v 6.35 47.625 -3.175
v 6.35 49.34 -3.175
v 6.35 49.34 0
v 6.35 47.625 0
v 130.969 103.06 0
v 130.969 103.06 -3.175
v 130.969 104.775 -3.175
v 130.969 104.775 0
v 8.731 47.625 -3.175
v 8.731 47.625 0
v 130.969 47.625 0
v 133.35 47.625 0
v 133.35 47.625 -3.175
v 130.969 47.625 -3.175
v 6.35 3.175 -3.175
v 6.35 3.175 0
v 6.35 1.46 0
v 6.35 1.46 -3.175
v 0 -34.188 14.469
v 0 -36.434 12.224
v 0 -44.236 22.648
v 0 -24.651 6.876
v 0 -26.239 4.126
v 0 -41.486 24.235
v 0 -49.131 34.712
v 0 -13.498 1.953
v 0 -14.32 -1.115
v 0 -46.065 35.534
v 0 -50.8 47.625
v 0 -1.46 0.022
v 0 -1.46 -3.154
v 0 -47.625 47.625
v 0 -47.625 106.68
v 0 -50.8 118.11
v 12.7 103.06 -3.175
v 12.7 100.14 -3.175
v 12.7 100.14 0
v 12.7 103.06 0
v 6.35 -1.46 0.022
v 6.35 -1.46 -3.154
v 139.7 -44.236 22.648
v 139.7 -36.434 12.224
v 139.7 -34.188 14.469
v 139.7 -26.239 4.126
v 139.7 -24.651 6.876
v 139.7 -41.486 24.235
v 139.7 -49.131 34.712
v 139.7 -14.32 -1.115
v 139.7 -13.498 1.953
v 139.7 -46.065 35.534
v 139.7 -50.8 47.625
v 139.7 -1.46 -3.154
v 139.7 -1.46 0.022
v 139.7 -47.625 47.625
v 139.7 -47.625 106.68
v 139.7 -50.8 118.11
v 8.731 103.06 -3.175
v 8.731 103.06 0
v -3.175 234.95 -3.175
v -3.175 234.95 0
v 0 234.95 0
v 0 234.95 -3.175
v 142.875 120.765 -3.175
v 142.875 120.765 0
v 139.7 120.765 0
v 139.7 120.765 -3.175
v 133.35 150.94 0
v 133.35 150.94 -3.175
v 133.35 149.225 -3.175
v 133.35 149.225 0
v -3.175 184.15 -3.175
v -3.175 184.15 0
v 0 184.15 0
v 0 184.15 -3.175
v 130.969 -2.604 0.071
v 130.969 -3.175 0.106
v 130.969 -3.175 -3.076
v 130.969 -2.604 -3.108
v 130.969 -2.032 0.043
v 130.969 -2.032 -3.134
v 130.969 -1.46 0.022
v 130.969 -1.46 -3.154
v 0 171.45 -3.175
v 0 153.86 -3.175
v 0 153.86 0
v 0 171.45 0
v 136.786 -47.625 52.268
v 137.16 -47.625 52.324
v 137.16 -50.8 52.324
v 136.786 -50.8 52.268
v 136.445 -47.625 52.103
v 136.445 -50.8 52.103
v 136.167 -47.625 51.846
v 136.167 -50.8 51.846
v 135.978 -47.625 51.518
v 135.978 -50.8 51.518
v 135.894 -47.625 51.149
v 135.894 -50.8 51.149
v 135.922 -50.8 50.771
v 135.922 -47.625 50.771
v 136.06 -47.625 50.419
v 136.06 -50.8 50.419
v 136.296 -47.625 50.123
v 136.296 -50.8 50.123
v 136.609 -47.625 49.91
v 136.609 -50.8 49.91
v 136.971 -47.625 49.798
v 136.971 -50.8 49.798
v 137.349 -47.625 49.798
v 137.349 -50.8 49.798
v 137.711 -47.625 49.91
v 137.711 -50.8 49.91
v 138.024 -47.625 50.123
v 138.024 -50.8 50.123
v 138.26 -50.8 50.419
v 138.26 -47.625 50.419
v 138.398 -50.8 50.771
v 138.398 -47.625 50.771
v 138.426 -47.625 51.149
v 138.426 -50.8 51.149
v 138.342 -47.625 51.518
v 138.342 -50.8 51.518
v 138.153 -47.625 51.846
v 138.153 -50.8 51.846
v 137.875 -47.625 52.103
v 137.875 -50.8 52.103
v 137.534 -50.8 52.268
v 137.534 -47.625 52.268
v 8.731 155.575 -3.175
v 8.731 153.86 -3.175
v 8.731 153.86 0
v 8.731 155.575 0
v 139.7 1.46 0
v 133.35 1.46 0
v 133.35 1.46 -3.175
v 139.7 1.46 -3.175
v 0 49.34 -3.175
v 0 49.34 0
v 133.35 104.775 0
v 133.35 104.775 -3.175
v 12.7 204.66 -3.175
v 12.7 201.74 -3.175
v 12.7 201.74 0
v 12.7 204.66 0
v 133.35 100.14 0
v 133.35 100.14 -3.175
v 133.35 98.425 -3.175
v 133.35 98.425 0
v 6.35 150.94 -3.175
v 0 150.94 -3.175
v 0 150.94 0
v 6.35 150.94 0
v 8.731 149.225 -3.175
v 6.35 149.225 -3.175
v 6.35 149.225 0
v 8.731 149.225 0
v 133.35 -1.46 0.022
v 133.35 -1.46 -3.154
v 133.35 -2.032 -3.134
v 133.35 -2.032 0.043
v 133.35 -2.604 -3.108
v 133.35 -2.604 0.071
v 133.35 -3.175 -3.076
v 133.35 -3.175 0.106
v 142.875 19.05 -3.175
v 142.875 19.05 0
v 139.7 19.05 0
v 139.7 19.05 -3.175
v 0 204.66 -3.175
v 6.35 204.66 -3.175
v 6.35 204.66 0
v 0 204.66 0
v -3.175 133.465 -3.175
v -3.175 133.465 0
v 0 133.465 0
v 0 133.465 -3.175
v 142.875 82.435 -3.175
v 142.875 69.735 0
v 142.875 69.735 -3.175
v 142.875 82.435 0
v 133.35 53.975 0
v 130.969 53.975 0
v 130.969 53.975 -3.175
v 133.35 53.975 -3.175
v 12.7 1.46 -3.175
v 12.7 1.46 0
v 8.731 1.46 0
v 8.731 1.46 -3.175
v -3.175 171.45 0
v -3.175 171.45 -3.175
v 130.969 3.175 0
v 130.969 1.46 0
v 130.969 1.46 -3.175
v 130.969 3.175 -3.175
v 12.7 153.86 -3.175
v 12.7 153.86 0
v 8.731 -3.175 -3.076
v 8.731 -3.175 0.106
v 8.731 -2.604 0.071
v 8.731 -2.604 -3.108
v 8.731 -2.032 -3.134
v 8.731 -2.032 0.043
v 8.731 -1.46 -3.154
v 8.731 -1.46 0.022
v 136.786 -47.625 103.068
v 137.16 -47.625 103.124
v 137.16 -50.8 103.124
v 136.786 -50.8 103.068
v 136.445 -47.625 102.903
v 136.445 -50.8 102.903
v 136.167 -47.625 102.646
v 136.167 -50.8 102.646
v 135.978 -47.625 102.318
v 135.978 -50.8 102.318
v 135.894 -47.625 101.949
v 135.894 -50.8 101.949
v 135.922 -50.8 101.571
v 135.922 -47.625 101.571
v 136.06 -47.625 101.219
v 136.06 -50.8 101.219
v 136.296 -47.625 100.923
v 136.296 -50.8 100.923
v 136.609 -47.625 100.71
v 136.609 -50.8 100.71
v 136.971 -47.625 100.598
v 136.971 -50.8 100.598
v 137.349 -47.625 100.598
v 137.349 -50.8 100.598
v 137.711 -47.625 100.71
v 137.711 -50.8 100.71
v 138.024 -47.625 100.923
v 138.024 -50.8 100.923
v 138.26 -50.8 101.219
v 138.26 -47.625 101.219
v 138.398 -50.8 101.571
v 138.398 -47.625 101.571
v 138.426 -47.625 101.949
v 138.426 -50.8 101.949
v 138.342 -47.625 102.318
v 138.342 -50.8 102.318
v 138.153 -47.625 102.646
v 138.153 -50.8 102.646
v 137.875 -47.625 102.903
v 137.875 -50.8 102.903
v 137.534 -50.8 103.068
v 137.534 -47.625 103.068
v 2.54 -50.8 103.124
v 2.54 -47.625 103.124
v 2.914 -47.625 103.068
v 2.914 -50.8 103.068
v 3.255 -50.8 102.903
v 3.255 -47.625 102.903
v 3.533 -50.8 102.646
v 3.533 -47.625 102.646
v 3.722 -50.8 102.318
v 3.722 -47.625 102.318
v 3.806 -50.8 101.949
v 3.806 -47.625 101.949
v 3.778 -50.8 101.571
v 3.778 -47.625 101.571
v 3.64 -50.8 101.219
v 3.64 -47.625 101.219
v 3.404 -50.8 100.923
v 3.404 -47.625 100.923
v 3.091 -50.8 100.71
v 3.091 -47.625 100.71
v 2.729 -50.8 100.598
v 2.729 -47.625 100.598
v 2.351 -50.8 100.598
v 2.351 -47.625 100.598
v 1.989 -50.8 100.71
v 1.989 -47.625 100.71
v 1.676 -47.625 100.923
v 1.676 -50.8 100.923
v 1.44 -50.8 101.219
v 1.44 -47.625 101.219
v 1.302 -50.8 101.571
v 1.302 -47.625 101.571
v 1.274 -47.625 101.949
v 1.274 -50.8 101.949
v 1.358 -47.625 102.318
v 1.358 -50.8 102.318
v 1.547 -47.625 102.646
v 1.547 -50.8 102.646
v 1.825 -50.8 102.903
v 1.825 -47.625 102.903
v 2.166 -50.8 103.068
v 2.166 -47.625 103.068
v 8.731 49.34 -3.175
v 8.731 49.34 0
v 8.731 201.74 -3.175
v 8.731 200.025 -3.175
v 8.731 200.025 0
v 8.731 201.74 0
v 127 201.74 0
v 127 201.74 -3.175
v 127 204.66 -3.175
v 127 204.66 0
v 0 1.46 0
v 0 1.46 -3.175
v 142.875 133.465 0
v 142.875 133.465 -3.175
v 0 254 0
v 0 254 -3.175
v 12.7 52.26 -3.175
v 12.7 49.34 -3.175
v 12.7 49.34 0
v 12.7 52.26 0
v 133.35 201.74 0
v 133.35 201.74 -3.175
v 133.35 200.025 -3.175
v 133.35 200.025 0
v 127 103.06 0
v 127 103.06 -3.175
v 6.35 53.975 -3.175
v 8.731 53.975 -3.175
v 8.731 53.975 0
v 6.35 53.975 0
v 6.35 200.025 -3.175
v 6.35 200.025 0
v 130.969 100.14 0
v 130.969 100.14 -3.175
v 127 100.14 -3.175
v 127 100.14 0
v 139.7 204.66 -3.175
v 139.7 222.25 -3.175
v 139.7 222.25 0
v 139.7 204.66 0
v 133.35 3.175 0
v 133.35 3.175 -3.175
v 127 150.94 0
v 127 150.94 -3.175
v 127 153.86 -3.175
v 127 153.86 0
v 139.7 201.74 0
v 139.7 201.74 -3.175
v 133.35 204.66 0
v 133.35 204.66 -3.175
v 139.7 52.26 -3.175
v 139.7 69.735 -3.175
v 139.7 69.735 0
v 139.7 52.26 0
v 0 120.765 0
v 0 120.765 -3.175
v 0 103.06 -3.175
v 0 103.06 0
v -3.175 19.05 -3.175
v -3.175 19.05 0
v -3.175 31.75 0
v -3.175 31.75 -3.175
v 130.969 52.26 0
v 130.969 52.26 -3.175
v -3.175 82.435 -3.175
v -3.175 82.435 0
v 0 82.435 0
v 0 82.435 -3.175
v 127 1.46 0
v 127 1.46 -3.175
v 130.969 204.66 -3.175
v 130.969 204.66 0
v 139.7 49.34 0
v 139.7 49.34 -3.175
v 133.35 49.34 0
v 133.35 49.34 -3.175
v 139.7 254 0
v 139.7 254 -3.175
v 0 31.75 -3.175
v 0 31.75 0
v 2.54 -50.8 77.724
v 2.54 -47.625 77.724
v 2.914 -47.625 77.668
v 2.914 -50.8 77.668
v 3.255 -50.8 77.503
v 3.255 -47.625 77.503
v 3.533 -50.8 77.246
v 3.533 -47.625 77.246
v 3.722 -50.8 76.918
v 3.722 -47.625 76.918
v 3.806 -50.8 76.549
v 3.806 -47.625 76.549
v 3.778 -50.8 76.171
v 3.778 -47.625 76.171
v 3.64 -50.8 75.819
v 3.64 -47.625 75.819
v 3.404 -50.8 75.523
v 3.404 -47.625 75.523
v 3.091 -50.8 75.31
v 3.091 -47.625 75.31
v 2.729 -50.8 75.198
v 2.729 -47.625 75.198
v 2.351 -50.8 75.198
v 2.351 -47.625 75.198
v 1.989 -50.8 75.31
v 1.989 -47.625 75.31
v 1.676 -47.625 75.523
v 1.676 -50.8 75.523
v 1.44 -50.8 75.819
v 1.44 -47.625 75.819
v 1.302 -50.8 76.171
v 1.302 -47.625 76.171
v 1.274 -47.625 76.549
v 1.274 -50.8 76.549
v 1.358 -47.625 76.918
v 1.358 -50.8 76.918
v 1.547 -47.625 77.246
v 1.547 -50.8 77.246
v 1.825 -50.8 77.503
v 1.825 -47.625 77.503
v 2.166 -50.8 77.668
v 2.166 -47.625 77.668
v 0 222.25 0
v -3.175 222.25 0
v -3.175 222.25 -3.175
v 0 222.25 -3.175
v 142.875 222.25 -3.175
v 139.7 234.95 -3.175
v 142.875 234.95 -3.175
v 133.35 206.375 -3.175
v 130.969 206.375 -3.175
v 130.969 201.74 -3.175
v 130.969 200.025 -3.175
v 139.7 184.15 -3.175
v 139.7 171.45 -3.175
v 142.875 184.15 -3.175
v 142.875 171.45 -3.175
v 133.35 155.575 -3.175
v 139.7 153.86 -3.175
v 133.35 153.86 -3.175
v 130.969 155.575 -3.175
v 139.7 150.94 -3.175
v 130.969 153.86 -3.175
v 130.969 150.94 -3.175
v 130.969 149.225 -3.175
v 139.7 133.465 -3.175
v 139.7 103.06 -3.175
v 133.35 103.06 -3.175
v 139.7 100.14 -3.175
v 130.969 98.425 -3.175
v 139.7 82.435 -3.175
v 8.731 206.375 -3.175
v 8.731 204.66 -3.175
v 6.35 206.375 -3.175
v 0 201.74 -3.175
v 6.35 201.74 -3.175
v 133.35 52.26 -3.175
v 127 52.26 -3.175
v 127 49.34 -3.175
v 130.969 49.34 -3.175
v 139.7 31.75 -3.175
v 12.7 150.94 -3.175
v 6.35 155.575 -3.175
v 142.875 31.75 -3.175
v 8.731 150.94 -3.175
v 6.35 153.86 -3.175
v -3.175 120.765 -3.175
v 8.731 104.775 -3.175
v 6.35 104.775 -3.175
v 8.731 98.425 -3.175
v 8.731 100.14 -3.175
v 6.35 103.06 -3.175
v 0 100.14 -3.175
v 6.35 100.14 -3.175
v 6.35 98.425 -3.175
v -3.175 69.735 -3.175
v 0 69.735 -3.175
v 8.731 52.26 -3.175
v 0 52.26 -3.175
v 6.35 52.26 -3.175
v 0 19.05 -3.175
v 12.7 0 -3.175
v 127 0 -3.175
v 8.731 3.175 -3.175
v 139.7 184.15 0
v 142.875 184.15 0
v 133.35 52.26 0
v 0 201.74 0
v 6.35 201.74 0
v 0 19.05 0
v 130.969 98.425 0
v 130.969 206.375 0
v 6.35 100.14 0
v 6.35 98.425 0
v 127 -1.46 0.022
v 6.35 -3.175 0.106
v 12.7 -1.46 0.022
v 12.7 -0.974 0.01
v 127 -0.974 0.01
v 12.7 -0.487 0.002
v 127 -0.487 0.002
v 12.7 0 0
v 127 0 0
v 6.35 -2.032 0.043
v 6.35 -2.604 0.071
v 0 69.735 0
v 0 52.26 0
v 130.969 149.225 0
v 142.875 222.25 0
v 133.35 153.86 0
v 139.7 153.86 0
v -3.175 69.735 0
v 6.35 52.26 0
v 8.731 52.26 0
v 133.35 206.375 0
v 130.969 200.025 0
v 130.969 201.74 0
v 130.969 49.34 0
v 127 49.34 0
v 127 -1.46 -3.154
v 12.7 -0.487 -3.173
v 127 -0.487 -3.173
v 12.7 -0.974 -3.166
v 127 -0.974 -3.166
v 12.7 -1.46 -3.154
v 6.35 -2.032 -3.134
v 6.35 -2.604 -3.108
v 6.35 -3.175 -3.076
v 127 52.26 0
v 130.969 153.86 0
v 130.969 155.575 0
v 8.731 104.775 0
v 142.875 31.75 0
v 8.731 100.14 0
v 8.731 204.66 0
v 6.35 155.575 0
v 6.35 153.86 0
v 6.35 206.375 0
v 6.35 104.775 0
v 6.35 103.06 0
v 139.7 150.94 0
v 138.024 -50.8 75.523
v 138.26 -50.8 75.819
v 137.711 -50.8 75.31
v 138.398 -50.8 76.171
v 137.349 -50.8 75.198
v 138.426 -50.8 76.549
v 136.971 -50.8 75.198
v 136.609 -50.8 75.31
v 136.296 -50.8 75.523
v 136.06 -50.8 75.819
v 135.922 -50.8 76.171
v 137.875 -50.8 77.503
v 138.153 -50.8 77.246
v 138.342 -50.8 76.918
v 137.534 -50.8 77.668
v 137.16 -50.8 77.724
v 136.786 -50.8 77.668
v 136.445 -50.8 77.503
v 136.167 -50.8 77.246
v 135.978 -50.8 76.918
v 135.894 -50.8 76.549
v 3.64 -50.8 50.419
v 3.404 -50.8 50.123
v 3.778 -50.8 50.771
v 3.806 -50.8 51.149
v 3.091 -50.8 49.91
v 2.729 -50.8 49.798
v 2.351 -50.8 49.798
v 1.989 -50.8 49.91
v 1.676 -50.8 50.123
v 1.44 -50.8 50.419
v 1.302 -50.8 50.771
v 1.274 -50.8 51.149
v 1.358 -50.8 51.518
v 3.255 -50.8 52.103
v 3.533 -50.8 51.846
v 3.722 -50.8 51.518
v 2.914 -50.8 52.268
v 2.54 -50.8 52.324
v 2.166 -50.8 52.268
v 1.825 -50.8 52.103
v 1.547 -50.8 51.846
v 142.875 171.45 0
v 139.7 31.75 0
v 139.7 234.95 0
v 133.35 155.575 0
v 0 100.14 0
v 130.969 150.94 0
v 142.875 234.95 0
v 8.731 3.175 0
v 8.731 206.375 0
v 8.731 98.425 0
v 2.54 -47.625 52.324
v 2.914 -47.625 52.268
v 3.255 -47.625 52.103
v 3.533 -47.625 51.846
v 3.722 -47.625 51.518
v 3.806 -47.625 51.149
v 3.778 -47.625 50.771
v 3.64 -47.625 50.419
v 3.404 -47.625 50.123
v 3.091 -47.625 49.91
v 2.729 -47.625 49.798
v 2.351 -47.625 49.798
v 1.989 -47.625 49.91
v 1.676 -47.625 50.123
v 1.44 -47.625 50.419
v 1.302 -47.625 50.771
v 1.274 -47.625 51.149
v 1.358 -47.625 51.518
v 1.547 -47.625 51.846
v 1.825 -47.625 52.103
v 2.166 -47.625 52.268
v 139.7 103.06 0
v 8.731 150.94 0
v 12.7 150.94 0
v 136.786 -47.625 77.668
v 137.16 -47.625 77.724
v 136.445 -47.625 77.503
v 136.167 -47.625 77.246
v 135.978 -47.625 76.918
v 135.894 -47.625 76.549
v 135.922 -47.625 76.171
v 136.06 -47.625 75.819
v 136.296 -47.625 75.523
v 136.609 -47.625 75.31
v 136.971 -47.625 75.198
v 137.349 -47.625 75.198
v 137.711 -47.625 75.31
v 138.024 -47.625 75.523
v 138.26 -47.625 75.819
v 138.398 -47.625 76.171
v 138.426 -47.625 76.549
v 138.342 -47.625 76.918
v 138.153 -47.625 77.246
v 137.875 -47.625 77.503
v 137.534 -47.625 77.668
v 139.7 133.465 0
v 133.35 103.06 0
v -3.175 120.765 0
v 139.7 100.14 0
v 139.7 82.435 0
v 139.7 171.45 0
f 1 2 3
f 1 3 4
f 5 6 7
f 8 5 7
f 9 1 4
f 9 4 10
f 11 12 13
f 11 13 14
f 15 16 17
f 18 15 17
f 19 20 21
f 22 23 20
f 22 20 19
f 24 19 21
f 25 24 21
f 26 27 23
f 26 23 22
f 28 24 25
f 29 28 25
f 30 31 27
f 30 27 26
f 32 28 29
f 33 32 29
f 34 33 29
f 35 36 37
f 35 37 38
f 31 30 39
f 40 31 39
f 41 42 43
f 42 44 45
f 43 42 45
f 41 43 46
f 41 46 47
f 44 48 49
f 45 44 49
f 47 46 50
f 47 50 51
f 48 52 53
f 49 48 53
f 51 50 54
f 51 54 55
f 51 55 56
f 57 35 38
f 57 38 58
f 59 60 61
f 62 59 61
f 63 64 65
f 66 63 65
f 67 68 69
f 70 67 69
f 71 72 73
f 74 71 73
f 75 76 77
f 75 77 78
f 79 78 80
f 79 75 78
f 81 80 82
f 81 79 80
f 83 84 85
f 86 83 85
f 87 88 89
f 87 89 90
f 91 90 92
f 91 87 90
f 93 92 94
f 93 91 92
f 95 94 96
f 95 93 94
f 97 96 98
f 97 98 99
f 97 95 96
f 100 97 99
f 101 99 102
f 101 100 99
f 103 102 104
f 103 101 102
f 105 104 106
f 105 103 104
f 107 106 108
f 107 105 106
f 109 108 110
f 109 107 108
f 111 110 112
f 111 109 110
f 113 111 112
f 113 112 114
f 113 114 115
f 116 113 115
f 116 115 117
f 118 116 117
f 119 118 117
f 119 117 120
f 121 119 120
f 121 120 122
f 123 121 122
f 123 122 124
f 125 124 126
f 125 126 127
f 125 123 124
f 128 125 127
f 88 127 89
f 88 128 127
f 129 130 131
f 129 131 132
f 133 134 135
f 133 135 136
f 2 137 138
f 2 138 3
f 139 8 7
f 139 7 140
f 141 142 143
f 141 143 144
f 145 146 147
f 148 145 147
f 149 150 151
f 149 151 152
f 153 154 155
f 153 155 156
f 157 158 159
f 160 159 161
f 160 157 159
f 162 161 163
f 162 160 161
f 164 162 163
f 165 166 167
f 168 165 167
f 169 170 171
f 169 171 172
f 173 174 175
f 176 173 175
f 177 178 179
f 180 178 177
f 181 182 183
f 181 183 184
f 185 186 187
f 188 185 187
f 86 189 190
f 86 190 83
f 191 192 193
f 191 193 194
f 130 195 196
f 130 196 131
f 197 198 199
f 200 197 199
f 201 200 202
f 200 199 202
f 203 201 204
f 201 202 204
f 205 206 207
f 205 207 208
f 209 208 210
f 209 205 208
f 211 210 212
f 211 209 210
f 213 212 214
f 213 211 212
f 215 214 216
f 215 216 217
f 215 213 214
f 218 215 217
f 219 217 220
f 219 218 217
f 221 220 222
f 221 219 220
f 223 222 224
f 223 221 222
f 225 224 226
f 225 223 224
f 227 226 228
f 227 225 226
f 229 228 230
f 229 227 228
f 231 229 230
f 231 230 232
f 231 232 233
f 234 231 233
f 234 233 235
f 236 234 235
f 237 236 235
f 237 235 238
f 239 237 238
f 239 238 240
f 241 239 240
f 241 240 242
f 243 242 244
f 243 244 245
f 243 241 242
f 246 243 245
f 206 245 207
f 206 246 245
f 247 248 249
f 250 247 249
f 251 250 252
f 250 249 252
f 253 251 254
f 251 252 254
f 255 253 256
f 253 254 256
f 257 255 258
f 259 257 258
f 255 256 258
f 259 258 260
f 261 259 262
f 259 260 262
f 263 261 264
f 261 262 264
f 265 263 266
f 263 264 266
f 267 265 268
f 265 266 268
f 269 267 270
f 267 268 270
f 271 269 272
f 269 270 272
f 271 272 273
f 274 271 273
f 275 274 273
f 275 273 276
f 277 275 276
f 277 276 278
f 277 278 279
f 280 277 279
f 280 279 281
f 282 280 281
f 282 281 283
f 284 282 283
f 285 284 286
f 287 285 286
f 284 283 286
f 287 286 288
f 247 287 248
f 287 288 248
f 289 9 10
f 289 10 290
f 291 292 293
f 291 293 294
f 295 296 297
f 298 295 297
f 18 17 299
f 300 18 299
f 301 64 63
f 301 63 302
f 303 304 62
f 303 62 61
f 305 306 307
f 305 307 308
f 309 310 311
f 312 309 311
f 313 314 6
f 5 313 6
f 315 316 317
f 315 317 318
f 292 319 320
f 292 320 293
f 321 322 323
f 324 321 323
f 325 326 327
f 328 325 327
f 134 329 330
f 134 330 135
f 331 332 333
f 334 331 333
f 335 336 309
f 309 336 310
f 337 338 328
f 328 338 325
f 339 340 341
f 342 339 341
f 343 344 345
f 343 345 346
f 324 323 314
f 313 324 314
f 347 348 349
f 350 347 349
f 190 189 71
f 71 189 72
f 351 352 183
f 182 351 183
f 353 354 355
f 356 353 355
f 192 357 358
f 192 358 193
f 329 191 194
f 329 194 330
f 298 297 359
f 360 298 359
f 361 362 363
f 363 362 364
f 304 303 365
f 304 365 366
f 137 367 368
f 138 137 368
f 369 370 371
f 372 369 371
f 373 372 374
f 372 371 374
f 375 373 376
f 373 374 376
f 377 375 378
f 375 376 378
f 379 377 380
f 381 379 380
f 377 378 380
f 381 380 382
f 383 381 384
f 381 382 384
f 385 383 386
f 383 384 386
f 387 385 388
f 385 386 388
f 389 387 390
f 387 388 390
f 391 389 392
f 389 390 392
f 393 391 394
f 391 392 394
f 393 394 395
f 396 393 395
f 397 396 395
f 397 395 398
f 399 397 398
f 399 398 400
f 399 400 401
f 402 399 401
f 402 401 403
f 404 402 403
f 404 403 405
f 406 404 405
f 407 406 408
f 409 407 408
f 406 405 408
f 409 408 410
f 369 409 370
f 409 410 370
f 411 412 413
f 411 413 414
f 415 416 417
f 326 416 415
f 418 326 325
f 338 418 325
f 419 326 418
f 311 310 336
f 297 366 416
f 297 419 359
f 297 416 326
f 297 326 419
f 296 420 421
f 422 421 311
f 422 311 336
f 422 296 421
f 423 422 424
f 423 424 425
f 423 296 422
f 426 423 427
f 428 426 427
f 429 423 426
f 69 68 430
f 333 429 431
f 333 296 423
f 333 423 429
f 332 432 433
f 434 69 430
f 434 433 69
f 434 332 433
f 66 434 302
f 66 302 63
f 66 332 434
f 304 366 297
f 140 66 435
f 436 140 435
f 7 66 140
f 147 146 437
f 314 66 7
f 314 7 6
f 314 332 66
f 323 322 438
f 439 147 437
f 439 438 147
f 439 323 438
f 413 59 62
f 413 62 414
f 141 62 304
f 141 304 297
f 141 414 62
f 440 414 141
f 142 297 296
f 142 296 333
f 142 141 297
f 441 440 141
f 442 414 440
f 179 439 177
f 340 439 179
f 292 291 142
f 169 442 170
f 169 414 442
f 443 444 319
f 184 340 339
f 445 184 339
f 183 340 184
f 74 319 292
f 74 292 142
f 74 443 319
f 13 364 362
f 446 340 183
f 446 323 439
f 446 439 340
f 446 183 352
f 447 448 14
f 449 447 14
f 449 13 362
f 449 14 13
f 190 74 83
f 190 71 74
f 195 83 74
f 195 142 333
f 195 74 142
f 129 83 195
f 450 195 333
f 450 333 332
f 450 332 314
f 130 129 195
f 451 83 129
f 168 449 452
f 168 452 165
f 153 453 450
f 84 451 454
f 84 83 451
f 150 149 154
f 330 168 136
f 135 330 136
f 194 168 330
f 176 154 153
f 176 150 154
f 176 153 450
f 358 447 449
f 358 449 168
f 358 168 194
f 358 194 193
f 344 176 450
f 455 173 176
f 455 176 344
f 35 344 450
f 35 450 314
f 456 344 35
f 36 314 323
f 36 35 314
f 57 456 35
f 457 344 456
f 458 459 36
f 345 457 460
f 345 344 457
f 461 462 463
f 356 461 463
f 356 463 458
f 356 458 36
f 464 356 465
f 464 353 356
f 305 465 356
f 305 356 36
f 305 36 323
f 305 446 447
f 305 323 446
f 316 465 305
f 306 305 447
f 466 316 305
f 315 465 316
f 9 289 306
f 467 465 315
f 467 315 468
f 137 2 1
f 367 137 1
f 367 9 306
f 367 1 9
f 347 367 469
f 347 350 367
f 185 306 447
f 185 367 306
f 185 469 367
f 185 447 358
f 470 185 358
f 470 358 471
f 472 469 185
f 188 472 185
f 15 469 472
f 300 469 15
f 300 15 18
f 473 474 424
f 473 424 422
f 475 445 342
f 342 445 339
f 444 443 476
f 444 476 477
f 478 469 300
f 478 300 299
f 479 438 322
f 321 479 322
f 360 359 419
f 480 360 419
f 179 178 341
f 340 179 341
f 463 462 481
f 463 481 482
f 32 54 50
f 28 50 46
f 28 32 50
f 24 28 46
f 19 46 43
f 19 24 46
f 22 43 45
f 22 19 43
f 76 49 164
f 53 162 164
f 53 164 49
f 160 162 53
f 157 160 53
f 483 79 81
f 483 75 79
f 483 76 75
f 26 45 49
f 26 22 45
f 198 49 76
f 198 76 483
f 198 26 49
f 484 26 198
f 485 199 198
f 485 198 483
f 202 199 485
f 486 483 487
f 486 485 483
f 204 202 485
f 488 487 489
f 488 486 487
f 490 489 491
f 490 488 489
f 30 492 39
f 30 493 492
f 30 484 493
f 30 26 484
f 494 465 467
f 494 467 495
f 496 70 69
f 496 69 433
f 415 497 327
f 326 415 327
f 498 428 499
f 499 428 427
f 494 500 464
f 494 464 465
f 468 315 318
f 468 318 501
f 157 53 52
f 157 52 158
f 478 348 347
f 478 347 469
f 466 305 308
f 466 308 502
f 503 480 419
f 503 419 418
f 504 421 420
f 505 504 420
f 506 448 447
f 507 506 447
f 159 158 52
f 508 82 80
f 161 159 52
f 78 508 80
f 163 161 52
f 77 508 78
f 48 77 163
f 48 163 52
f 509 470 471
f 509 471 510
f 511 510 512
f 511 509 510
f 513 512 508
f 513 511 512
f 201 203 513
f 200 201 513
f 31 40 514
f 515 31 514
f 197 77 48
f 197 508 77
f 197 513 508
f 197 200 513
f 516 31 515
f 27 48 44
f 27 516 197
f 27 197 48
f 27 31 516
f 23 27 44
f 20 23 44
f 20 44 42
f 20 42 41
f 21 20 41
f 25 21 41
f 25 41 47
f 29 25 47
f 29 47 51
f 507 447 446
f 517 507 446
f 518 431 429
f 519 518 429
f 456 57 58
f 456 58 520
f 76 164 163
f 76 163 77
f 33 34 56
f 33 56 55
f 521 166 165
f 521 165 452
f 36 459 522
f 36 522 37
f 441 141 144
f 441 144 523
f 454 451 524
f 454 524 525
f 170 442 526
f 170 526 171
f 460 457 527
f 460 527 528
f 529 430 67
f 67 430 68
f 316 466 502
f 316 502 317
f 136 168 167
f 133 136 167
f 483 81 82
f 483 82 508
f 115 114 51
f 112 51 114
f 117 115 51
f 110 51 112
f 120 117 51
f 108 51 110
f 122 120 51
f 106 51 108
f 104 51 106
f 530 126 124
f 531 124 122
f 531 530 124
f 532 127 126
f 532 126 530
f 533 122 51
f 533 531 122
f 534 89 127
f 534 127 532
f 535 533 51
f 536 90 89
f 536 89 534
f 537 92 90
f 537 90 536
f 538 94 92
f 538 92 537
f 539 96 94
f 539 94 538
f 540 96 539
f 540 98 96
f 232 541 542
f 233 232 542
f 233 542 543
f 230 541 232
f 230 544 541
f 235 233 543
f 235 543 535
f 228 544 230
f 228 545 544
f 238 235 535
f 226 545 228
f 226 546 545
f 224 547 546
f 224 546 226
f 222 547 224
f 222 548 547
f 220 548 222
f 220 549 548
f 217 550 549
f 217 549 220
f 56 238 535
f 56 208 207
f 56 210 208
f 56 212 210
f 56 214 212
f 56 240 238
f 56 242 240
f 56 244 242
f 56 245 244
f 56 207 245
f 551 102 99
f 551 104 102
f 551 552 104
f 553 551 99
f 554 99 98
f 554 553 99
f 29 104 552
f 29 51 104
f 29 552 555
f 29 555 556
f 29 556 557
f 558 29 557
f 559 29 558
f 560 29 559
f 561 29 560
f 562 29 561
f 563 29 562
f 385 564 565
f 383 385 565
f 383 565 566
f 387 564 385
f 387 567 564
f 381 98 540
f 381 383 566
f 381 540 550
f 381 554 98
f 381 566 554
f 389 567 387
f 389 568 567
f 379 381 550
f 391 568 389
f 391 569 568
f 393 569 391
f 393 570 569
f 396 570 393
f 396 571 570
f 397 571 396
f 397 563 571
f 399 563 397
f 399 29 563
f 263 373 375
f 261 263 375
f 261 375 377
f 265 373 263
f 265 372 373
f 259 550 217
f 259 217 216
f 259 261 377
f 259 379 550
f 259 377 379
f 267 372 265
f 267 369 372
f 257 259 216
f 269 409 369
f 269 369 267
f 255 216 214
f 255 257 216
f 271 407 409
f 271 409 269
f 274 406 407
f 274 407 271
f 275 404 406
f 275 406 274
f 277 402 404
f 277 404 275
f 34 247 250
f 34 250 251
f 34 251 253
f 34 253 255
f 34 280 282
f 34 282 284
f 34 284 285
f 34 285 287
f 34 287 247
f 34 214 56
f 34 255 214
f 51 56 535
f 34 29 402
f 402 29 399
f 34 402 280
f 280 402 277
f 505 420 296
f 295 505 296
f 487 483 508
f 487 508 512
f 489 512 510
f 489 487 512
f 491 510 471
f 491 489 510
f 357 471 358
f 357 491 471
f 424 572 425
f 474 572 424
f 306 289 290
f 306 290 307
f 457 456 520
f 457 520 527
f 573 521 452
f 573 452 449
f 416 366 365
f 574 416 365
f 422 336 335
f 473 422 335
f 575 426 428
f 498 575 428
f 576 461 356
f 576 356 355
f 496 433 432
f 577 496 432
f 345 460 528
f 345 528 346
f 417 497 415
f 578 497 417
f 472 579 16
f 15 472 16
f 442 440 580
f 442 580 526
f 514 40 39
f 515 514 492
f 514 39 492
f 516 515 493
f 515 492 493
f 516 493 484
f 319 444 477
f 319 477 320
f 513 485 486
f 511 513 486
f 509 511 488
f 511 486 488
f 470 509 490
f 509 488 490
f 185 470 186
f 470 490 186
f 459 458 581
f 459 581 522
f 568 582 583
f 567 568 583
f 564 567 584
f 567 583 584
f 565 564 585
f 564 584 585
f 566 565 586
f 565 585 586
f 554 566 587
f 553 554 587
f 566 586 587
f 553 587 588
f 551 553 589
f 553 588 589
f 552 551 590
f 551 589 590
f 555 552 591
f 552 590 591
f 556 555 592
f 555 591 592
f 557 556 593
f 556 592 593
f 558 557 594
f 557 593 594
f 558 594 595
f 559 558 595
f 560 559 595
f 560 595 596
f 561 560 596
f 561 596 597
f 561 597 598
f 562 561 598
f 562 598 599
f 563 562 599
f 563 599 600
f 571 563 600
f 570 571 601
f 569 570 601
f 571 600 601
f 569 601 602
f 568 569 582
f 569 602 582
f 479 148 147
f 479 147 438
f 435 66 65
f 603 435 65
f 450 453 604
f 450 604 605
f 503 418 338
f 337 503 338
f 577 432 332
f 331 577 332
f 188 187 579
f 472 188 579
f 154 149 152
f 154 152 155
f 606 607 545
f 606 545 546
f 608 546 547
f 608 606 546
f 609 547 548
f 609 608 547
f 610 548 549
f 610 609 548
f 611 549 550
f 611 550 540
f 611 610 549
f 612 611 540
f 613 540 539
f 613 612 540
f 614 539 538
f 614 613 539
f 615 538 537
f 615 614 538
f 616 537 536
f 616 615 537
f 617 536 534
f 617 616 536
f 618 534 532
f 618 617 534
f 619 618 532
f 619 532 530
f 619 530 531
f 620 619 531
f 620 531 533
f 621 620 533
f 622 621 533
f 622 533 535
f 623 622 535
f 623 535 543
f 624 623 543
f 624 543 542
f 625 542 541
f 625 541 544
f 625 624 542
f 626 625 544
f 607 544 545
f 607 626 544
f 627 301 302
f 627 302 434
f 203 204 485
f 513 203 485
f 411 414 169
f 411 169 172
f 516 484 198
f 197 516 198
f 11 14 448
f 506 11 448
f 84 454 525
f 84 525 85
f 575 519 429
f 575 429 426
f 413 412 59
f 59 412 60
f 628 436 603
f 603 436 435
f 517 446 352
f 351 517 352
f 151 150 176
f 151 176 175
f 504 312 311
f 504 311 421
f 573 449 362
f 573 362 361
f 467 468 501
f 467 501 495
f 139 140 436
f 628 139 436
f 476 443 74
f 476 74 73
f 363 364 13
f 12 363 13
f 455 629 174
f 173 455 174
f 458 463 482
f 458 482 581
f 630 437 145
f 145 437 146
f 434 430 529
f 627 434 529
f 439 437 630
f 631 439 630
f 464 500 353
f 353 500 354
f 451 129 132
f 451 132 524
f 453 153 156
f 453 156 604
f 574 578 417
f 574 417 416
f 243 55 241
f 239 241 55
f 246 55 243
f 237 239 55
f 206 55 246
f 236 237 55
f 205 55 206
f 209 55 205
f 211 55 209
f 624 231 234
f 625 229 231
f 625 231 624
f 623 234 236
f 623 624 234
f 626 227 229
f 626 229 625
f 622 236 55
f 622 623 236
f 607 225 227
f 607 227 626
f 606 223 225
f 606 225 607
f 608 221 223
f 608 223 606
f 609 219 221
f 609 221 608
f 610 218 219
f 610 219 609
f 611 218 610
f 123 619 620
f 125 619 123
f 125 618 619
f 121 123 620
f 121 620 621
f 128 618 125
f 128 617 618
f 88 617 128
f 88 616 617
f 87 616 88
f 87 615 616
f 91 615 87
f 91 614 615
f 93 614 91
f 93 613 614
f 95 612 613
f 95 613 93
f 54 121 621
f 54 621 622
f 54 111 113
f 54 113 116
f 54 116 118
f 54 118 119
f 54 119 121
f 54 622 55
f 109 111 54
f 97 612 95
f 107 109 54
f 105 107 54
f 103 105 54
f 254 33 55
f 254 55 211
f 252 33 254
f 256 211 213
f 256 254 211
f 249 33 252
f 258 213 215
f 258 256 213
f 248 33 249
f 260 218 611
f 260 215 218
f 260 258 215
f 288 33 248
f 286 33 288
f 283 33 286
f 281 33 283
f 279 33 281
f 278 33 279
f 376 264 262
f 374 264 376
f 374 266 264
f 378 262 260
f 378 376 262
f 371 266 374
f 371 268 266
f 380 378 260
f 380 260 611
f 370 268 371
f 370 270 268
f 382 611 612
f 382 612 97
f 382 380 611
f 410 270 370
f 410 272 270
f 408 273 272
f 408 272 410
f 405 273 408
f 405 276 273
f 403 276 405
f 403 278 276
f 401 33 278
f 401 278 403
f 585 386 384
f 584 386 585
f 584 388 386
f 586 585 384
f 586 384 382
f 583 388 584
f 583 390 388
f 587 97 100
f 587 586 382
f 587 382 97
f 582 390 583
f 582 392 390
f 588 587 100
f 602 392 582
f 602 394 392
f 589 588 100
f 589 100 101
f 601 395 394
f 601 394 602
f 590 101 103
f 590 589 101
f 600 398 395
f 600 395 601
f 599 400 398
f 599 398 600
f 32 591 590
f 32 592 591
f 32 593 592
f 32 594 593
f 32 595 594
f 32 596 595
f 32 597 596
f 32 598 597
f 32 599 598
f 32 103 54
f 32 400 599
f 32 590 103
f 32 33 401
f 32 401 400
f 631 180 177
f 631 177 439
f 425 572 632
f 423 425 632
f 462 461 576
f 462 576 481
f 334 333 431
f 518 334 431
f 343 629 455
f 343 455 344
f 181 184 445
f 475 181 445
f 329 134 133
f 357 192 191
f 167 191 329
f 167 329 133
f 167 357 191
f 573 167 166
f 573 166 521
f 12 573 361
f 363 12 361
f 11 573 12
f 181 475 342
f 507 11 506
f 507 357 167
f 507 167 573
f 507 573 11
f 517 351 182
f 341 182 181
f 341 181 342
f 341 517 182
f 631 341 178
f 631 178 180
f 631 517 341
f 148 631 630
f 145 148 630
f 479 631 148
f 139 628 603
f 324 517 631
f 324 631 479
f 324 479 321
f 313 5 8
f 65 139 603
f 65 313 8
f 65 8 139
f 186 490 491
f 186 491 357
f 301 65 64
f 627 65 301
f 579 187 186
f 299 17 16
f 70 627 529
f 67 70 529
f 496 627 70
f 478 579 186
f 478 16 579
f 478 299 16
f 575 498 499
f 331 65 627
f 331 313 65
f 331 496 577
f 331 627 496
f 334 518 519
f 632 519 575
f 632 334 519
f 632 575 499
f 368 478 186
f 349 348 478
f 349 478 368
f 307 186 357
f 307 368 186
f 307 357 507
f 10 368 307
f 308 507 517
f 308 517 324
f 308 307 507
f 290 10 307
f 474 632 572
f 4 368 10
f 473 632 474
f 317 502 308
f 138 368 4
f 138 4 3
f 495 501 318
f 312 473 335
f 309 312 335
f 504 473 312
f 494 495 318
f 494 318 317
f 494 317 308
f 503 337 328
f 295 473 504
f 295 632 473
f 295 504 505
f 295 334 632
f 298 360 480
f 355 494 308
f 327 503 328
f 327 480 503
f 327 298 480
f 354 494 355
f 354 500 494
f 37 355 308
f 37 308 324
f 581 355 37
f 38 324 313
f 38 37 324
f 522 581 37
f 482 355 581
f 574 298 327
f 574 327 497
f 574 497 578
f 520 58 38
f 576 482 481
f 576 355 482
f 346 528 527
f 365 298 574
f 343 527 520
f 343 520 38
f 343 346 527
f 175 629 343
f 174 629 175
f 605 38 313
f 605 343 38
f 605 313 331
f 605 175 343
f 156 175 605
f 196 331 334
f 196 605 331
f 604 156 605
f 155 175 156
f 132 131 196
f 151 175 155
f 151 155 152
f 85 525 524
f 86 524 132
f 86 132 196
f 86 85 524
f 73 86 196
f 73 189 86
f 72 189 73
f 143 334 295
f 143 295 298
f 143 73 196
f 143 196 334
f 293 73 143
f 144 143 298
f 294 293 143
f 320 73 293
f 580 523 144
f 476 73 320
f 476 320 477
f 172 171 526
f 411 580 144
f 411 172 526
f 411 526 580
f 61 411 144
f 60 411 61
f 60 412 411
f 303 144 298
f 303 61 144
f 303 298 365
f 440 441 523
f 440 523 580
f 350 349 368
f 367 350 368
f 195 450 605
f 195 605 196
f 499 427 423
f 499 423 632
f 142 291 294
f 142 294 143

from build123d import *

# Parameters (mm, degrees)
BOSS_EXTRUDE1_DEPTH = 139.7
CUT_EXTRUDE1_DEPTH  = 3.175
SKETCH5_W           = 3.175
SKETCH5_H           = 12.7
BOSS_EXTRUDE2_DEPTH = 3.175
SKETCH8_R           = 1.27
CUT_EXTRUDE2_DEPTH  = 3.175


with BuildPart() as part:
    # Sketch1 → Boss-Extrude1 (new body)
    with BuildSketch(Plane(origin=(0, 0, 0), x_dir=(0, 0, -1), z_dir=(1, 0, 0))):
        with BuildLine():
            Line((-118.11, -50.8), (-106.68, -47.625))
            Line((-106.68, -47.625), (-47.625, -47.625))
            ThreePointArc((-47.625, -47.625), (-13.949039546, -33.675960454), (0, 0))
            Line((0, 0), (0, 254))
            Line((0, 254), (3.175, 254))
            Line((3.175, 254), (3.175, 0))
            ThreePointArc((3.175, 0), (-11.703975516, -35.921024484), (-47.625, -50.8))
            Line((-47.625, -50.8), (-118.11, -50.8))
        make_face()
    extrude(amount=BOSS_EXTRUDE1_DEPTH)

    # Sketch4 → Cut-Extrude1 (cut, symmetric)
    with BuildSketch(Plane.XY):
        Polygon((0, 204.6605), (0, 201.7395), (6.35, 201.7395), (6.35, 200.025), (8.73125, 200.025), (8.73125, 201.7395), (12.7, 201.7395), (12.7, 203.2), (12.7, 204.6605), (8.73125, 204.6605), (8.73125, 206.375), (6.35, 206.375), (6.35, 204.6605), align=None)
        Polygon((0, 153.8605), (0, 150.9395), (6.35, 150.9395), (6.35, 149.225), (8.73125, 149.225), (8.73125, 150.9395), (12.7, 150.9395), (12.7, 152.4), (12.7, 153.8605), (8.73125, 153.8605), (8.73125, 155.575), (6.35, 155.575), (6.35, 153.8605), align=None)
        Polygon((0, 103.0605), (0, 100.1395), (6.35, 100.1395), (6.35, 98.425), (8.73125, 98.425), (8.73125, 100.1395), (12.7, 100.1395), (12.7, 101.6), (12.7, 103.0605), (8.73125, 103.0605), (8.73125, 104.775), (6.35, 104.775), (6.35, 103.0605), align=None)
        Polygon((0, 52.2605), (0, 49.3395), (6.35, 49.3395), (6.35, 47.625), (8.73125, 47.625), (8.73125, 49.3395), (12.7, 49.3395), (12.7, 50.8), (12.7, 52.2605), (8.73125, 52.2605), (8.73125, 53.975), (6.35, 53.975), (6.35, 52.2605), align=None)
        Polygon((0, 1.4605), (0, -1.4605), (6.35, -1.4605), (6.35, -3.175), (8.73125, -3.175), (8.73125, -1.4605), (12.7, -1.4605), (12.7, 0), (12.7, 1.4605), (8.73125, 1.4605), (8.73125, 3.175), (6.35, 3.175), (6.35, 1.4605), align=None)
    cut_extrude1 = extrude(amount=CUT_EXTRUDE1_DEPTH, both=True, mode=Mode.SUBTRACT)

    # Sketch5 → Boss-Extrude2 (add)
    with BuildSketch(Plane.XY):
        with Locations((-1.5875, 228.6)):
            Rectangle(SKETCH5_W, SKETCH5_H)
        with Locations((-1.5875, 177.8)):
            Rectangle(SKETCH5_W, SKETCH5_H)
        with Locations((-1.5875, 25.4)):
            Rectangle(SKETCH5_W, SKETCH5_H)
        with Locations((-1.5875, 76.085444403)):
            Rectangle(SKETCH5_W, SKETCH5_H)
        with Locations((-1.5875, 127.114555597)):
            Rectangle(SKETCH5_W, SKETCH5_H)
    boss_extrude2 = extrude(amount=-BOSS_EXTRUDE2_DEPTH)

    # Mirror1: Cut-Extrude1, Boss-Extrude2 across plane
    add(cut_extrude1.mirror(Plane(origin=(69.85, 0, 0), x_dir=(0, 0, 1), z_dir=(1, 0, 0))), mode=Mode.SUBTRACT)
    add(boss_extrude2.mirror(Plane(origin=(69.85, 0, 0), x_dir=(0, 0, 1), z_dir=(1, 0, 0))))

    # Sketch8 → Cut-Extrude2 (cut)
    with BuildSketch(Plane(origin=(0, -47.625, 0), x_dir=(1, 0, 0), z_dir=(0, 1, 0))):
        with Locations((2.54, -51.054)):
            Circle(SKETCH8_R)
        with Locations((2.54, -76.454)):
            Circle(SKETCH8_R)
        with Locations((2.54, -101.854)):
            Circle(SKETCH8_R)
    cut_extrude2 = extrude(amount=-CUT_EXTRUDE2_DEPTH, mode=Mode.SUBTRACT)

    # Mirror2: Cut-Extrude2 across plane
    add(cut_extrude2.mirror(Plane(origin=(69.85, 0, 0), x_dir=(0, 0, 1), z_dir=(1, 0, 0))), mode=Mode.SUBTRACT)


solid = part.part
